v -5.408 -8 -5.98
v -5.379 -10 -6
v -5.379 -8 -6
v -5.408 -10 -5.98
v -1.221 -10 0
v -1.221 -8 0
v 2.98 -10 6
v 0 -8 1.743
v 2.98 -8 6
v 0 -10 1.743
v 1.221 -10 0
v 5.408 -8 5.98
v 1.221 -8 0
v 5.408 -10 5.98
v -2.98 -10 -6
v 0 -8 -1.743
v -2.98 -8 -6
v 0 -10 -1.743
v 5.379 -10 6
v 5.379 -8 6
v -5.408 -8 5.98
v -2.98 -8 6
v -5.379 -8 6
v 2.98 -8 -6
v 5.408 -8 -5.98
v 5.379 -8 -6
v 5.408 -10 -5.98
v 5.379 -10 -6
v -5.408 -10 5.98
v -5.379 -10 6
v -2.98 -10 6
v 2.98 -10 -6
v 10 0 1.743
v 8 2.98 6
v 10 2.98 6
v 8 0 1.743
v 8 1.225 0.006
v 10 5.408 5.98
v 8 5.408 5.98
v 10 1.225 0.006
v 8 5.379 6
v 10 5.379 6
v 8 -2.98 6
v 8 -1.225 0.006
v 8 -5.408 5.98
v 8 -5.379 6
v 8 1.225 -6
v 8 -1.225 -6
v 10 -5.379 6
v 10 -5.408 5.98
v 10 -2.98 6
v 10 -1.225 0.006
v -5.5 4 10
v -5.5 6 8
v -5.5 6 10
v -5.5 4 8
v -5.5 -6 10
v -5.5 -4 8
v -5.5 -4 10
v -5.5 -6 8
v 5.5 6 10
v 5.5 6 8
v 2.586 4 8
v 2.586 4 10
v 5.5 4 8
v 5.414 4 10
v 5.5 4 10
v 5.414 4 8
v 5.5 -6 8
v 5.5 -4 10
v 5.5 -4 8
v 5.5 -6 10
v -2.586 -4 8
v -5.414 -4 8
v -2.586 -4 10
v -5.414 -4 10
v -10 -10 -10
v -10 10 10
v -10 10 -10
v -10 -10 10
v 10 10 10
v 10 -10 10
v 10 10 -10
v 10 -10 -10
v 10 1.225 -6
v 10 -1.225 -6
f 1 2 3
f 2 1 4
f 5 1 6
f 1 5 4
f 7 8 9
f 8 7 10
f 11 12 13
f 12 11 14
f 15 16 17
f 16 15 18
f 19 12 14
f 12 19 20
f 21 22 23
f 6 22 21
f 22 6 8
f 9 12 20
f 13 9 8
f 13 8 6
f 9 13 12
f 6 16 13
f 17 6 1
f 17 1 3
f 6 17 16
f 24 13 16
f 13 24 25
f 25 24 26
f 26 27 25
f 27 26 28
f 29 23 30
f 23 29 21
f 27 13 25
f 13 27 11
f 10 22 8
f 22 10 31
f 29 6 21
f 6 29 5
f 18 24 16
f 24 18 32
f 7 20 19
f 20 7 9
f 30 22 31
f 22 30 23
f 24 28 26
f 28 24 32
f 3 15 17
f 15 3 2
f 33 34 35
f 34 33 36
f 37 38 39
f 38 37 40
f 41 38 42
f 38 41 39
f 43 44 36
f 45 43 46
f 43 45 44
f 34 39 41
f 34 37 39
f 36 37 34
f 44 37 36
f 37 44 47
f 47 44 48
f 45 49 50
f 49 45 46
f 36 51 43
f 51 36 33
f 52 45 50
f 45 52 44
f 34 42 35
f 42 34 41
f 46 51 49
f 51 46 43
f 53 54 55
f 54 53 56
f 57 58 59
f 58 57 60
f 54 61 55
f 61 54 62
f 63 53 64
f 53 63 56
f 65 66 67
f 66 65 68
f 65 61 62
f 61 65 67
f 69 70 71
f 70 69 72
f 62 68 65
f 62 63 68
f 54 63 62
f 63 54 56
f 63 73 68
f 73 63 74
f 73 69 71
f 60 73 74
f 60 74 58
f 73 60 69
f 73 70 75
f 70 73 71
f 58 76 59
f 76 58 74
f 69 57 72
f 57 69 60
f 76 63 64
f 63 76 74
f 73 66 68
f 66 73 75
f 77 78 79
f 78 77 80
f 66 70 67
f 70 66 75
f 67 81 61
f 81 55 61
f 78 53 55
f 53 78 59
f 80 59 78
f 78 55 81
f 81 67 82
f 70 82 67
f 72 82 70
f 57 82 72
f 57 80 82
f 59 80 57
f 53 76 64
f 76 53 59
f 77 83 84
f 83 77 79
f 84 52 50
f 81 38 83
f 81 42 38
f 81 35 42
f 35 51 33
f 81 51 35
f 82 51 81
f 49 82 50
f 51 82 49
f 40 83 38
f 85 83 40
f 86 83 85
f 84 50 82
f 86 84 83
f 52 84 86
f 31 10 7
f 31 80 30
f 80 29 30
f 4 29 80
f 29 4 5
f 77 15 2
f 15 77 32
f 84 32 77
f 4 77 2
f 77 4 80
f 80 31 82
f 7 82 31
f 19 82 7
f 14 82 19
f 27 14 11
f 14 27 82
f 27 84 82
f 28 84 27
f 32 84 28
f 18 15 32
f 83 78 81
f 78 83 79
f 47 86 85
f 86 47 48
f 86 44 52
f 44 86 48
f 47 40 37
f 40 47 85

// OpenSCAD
// file: ../../src/xyzcalicube.scad
// src/xyzcalicube.scad
// XYZ Calibration Cube Library
// Version Author: Cameron K. Brooks

/* [General Parameters] */
// The size of the calibration cube
cube_size = 20;

/* [Calculated Parameters] */
// The value to use for creating the model preview (lower is faster)
preview_quality_value = 24;

// The value to use for creating the final model render (higher is more detailed)
render_quality_value = 48;

// Calculate the rendering quality
$fn = $preview ? preview_quality_value : render_quality_value;

/* [Main Model Generation Module] */

// Generates the XYZ calibration cube
module generate_xyz_cali_cube(cube_size = 20) {
    s = cube_size;
    // Scale all hard-coded offsets proportionally to cube_size
    sc = s / 20;

    rotate([0, 0, 180])
    difference() {
        cube([s, s, s], center = true);

        // X cut out
        difference() {
            union() {
                translate([0, 9.005 * sc, 0]) rotate([0, 55, 0]) cube([16 * sc, 2.01 * sc, 2 * sc], center = true);
                translate([0, 9.005 * sc, 0]) rotate([0, -55, 0]) cube([16 * sc, 2.01 * sc, 2 * sc], center = true);
            }
            translate([0, 8.5 * sc, 7 * sc]) cube([16 * sc, 3.5 * sc, 2 * sc], center = true);
            translate([0, 8.5 * sc, -7 * sc]) cube([16 * sc, 3.5 * sc, 2 * sc], center = true);
        }

        // Y cut out
        rotate([0, 0, 90])
        difference() {
            union() {
                translate([0, 9.005 * sc, 0]) rotate([0, 55, 0]) cube([16 * sc, 2.01 * sc, 2 * sc], center = true);
                translate([0, 9.005 * sc, 0]) rotate([0, -55, 0]) cube([16 * sc, 2.01 * sc, 2 * sc], center = true);
            }
            translate([0, 8.5 * sc, 7 * sc]) cube([16 * sc, 3.5 * sc, 2 * sc], center = true);
            translate([0, 8.5 * sc, -4 * sc]) cube([16 * sc, 3.5 * sc, 8 * sc], center = true);
        }
        translate([-9 * sc, 0, -2.9 * sc]) cube([2 * sc, 2.45 * sc, 6.2 * sc], center = true);

        // Z cut out
        rotate([90, 0, 0])
        intersection() {
            translate([0, 9.005 * sc, 0]) cube([11 * sc, 2.01 * sc, 12 * sc], center = true);
            union() {
                translate([0, 9.005 * sc, 5 * sc]) cube([11 * sc, 2.01 * sc, 2 * sc], center = true);
                translate([0, 9.005 * sc, -5 * sc]) cube([11 * sc, 2.01 * sc, 2 * sc], center = true);
                translate([0, 9.005 * sc, 0]) rotate([0, 45, 0]) cube([16 * sc, 2.01 * sc, 2 * sc], center = true);
            }
        }
    }
}
// main file
// XYZ calibration cube
// A 20 mm cube with X, Y and Z cut into its faces, to measure each axis.

include <../../src/xyzcalicube.scad>;

/* [User Parameters] */

// The size of the calibration cube
cube_size = 20;

/* [Quality Settings] */

// Set the rendering quality
preview_quality_value = 24;
render_quality_value = 48; // Increase for higher detail

$fn = $preview ? preview_quality_value : render_quality_value;

/* [Generate the XYZ Calibration Cube] */

generate_xyz_cali_cube(
  cube_size=cube_size
);
